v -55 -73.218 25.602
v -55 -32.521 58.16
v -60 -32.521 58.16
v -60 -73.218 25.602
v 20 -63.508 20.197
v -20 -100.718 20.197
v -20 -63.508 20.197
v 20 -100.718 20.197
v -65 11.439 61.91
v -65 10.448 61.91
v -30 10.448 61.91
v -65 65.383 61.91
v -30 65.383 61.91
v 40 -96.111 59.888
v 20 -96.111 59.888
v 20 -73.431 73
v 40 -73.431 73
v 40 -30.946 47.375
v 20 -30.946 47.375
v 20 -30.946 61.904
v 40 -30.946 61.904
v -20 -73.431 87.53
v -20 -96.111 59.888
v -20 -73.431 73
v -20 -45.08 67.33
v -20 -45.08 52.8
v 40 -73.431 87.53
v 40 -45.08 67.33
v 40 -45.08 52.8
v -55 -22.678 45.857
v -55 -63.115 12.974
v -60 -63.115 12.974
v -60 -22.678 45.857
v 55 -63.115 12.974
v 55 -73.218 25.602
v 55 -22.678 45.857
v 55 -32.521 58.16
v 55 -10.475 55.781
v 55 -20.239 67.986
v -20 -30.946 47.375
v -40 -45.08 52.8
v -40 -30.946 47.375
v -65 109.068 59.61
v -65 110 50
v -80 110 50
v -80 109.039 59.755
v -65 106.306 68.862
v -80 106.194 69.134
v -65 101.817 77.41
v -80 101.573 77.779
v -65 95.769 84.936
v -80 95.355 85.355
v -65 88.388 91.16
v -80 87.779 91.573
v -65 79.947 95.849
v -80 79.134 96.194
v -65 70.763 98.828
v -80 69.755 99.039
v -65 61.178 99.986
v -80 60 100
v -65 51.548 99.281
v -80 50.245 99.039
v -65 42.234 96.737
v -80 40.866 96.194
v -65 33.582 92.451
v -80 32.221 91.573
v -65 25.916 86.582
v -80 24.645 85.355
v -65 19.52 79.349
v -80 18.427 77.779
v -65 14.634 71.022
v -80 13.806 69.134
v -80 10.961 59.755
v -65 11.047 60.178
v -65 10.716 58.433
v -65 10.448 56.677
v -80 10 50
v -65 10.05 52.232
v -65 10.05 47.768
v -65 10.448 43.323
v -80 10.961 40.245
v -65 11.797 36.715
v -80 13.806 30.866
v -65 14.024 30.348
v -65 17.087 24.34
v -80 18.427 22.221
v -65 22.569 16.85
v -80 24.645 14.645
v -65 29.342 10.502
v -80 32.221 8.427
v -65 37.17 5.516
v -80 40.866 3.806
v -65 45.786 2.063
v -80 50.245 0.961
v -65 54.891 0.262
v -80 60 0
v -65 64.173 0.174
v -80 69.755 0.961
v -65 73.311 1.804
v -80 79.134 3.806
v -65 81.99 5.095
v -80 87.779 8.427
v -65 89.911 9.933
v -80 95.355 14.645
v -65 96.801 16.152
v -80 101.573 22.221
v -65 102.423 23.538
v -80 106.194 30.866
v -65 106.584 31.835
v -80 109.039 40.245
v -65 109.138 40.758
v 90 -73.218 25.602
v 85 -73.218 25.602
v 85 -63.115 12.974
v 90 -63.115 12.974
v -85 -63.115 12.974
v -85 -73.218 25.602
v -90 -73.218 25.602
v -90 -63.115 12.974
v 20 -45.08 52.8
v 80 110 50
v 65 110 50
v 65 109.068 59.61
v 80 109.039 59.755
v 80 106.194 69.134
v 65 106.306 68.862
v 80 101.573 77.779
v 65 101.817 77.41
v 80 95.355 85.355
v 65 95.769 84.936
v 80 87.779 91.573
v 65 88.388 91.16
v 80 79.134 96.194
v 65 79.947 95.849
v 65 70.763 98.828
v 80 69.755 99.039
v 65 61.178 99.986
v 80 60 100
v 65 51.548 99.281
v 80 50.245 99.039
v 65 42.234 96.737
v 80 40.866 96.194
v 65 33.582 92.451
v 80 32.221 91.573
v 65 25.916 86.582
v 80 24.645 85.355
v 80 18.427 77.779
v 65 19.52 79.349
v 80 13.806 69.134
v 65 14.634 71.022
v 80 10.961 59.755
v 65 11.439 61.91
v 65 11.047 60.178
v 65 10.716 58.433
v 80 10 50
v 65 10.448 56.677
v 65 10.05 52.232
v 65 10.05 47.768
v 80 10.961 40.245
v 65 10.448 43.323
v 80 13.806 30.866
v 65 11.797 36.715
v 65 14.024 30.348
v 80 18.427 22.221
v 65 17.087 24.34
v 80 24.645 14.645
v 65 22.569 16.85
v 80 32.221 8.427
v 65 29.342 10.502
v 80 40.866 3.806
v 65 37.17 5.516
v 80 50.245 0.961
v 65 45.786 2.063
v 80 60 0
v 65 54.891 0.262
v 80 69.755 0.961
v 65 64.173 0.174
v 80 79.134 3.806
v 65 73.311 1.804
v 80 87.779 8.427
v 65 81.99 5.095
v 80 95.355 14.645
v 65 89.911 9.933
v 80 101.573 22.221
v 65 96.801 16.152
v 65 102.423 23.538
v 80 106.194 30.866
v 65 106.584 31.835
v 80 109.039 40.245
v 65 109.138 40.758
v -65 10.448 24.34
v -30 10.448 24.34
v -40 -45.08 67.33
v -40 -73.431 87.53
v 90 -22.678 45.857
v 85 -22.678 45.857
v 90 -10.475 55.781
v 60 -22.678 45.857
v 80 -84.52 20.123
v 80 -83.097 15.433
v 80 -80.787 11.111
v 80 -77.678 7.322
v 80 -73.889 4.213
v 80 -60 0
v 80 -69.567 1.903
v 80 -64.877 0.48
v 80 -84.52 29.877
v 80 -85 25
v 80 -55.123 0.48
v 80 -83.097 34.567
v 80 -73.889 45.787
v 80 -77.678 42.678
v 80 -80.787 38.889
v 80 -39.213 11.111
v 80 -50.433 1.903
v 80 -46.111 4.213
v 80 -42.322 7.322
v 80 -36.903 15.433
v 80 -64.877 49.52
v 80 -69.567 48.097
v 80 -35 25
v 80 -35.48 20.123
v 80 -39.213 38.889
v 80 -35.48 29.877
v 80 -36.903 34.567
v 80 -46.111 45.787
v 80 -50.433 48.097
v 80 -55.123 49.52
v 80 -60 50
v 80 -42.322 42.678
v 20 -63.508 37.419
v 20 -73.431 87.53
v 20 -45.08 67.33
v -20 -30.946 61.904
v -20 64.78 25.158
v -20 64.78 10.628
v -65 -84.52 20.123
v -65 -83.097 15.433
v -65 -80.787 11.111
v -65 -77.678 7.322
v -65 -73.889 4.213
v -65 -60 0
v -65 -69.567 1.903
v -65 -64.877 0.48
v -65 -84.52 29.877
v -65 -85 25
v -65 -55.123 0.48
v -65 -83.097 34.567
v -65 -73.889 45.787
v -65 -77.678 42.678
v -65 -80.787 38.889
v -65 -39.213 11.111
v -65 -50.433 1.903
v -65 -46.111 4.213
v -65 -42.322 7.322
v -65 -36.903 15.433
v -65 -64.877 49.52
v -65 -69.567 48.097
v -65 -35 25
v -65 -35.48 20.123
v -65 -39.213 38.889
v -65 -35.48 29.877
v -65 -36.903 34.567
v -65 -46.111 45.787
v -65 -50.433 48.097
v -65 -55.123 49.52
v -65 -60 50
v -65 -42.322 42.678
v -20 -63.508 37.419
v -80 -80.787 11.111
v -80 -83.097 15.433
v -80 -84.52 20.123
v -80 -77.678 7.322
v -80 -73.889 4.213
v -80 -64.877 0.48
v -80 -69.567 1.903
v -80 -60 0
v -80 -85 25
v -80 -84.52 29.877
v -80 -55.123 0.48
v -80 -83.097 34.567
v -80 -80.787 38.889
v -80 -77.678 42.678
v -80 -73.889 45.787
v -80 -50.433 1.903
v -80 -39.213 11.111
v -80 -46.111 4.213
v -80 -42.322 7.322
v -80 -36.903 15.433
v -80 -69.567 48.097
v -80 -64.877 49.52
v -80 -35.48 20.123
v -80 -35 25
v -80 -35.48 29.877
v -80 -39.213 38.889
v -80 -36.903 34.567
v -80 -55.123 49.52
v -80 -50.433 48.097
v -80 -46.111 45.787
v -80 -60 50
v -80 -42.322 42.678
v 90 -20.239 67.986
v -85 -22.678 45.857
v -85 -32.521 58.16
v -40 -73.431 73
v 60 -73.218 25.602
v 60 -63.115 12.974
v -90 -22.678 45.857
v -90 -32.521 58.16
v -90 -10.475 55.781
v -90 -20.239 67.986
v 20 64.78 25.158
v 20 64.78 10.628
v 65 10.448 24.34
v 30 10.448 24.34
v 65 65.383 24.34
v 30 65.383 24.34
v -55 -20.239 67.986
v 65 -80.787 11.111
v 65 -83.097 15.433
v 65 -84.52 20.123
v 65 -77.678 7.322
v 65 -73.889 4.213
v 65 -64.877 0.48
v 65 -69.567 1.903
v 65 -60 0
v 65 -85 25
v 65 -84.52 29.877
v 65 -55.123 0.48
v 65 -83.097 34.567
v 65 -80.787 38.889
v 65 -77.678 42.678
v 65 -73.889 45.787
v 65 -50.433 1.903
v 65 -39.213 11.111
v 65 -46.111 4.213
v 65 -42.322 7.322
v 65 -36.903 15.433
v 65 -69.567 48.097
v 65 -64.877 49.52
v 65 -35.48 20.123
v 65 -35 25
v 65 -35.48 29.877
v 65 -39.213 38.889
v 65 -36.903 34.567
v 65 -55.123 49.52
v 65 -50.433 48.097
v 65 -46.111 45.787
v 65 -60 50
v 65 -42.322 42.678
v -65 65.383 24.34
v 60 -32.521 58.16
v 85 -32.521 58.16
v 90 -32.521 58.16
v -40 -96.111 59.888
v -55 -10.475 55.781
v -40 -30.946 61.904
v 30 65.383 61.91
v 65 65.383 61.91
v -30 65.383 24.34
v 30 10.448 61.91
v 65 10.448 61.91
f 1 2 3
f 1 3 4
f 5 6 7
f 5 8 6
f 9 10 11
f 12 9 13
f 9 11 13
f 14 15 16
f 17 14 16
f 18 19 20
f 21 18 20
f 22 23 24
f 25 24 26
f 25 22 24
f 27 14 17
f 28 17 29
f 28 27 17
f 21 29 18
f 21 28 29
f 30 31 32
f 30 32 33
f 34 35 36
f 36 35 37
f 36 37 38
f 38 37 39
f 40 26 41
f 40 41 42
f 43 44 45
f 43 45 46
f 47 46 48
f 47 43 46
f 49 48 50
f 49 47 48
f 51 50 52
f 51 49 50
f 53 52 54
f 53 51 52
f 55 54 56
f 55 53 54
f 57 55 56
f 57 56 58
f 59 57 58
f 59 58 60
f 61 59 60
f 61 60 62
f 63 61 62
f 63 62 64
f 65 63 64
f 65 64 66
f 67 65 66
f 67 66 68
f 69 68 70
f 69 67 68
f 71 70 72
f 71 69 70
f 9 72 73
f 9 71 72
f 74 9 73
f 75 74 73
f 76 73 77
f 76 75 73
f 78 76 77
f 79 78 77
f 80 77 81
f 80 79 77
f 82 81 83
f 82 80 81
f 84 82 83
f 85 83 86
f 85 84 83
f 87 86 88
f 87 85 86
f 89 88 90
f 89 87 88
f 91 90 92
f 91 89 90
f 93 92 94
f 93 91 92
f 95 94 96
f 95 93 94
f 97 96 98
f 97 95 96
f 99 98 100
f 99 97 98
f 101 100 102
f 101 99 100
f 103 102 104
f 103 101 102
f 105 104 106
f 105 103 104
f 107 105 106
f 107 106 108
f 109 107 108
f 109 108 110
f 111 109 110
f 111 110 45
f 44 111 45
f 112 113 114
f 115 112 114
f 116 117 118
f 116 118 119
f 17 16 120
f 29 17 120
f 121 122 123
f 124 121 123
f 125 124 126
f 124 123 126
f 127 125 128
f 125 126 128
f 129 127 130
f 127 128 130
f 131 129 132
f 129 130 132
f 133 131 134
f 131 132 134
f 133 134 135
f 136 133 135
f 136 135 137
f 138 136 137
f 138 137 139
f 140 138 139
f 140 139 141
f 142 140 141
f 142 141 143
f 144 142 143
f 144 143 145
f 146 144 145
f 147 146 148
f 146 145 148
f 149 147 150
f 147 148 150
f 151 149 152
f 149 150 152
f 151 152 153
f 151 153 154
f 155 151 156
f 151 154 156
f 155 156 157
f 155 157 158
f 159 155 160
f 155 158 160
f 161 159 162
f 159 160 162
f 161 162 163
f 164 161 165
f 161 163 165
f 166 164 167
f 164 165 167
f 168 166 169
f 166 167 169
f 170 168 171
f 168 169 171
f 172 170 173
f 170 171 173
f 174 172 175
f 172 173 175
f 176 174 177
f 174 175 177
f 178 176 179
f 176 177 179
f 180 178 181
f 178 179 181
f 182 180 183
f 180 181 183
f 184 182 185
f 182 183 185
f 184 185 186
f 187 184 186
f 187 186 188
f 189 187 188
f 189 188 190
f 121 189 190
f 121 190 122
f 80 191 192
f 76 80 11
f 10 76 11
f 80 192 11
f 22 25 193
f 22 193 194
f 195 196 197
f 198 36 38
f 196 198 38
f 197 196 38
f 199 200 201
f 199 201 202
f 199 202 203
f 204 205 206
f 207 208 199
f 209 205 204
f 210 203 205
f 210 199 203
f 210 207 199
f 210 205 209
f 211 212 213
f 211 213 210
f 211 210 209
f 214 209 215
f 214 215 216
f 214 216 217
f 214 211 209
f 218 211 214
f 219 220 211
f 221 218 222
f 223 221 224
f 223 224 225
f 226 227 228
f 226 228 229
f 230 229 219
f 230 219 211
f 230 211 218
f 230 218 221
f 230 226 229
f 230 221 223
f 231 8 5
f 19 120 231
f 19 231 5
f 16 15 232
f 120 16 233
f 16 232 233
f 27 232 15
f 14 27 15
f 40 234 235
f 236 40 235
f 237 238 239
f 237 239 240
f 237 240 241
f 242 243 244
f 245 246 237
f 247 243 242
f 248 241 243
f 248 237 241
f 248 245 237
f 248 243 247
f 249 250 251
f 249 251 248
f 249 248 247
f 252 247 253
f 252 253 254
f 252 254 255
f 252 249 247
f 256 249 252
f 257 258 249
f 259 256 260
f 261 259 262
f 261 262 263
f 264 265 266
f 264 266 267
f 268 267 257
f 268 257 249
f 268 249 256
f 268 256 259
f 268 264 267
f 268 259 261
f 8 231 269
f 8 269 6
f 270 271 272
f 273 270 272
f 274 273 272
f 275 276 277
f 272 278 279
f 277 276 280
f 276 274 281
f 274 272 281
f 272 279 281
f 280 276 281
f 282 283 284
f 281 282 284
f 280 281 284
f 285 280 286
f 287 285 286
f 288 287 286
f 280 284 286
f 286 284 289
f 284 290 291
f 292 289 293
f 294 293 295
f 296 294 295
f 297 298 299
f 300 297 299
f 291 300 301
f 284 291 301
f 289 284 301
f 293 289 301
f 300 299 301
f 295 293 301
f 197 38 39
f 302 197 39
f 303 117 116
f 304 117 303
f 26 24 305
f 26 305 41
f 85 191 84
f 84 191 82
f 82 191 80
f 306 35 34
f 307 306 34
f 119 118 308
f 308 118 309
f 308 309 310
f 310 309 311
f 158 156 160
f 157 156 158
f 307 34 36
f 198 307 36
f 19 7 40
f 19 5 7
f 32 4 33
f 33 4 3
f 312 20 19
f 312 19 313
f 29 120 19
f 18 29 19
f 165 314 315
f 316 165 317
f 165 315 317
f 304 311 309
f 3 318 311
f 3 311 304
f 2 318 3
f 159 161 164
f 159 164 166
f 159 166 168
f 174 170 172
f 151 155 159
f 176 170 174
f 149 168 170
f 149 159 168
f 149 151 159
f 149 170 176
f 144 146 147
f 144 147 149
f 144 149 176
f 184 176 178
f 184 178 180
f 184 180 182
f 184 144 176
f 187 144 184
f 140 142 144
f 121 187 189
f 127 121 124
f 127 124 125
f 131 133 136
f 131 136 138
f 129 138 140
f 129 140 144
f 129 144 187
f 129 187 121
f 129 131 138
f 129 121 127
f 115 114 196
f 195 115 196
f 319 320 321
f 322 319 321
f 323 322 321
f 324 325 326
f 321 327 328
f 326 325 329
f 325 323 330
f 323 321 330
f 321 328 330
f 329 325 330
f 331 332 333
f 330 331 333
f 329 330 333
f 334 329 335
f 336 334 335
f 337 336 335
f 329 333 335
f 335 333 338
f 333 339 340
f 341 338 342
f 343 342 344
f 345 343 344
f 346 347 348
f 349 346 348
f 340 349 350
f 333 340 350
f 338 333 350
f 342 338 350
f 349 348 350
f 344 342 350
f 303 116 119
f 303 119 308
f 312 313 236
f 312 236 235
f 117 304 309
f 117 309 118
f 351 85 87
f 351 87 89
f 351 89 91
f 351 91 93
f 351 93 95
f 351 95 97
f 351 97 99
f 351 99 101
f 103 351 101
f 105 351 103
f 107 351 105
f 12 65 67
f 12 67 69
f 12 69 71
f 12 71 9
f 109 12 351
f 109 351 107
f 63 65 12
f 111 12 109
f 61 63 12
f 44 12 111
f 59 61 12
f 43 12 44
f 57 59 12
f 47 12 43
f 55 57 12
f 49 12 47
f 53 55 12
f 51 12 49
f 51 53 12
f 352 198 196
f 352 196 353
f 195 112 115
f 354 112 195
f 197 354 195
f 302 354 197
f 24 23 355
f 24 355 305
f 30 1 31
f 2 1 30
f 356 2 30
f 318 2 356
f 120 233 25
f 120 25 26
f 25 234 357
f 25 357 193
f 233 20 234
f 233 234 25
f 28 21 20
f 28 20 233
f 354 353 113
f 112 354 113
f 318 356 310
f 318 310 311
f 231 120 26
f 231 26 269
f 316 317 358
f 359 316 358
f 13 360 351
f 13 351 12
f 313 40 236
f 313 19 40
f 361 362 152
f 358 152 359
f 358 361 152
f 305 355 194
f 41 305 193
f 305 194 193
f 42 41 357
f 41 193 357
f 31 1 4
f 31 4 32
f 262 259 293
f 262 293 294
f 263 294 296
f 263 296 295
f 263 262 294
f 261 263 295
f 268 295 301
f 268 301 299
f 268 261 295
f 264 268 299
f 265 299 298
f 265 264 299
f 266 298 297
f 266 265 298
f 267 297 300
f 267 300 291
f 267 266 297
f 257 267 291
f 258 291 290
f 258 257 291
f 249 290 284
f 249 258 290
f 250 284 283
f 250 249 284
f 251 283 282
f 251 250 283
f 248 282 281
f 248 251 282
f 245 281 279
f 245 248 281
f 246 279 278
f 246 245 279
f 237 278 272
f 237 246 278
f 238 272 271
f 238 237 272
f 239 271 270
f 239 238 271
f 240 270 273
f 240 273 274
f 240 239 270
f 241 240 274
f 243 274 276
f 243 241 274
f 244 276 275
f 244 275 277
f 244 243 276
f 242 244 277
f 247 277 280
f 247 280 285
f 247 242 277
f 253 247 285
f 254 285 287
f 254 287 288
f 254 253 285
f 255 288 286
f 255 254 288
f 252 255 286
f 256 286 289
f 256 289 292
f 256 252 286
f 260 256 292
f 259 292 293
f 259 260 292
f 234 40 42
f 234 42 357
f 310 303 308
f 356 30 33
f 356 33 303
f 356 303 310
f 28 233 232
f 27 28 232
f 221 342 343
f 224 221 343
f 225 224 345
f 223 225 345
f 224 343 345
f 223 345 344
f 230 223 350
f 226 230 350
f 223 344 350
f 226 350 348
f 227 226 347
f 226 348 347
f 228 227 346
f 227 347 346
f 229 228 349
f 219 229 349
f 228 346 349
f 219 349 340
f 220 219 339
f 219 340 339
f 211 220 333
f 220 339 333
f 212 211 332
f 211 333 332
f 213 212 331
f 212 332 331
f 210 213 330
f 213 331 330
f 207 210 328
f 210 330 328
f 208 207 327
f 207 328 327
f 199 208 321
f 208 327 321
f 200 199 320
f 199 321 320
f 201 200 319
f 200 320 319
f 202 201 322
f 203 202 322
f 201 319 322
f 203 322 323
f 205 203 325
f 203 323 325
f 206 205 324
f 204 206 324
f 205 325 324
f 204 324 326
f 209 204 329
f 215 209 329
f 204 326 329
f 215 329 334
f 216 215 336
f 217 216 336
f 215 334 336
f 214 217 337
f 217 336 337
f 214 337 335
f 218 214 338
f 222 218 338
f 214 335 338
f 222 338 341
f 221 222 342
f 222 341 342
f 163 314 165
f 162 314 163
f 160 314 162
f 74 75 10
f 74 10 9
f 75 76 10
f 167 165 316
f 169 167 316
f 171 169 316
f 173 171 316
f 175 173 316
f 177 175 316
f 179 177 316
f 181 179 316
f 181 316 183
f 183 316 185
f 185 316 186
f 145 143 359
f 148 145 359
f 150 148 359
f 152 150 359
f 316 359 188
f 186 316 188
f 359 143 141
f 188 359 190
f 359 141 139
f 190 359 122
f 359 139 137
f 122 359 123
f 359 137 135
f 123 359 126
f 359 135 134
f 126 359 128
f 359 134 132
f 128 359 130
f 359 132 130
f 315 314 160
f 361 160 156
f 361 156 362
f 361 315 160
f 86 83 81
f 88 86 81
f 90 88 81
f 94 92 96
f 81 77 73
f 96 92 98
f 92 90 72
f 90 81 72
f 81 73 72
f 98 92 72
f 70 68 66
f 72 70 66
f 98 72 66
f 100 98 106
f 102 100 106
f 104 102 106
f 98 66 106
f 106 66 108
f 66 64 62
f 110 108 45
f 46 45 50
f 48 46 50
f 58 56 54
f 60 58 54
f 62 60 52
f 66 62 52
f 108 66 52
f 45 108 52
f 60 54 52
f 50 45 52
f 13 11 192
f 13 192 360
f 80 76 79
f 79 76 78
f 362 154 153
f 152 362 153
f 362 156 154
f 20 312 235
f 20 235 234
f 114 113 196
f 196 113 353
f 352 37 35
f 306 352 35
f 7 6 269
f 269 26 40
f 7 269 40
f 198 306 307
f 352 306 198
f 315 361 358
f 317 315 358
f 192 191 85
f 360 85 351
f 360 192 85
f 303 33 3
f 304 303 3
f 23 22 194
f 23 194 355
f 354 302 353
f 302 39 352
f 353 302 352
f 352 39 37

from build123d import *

# Parameters (mm, degrees)
F1_START = 65
F0_R     = 50
F1_DEPTH = 15
F0_R_2   = 25
F3_START = 55
F3_DEPTH = 35
F4_START = 30
F2_W     = 54.935564287
F2_H     = 37.570875138
F4_DEPTH = 35
F5_START = 60
F5_DEPTH = 25
F7_DEPTH = 20
F8_START = 20
F8_DEPTH = 20


with BuildPart() as f1:
    # F0 (on Right) → F1 (new body)
    with BuildSketch(Plane.YZ.offset(F1_START)):
        with Locations((60, 50)):
            Circle(F0_R)
    extrude(amount=F1_DEPTH)

    # F2 (on Right) → F4 (join)
    with BuildSketch(Plane.YZ.offset(F4_START)):
        with Locations((37.9155925475, 43.1249979883)):
            Rectangle(F2_W, F2_H)
    extrude(amount=F4_DEPTH)


with BuildPart() as f1b:
    # F0 (on Right) → F1, piece 2 (new body)
    with BuildSketch(Plane.YZ.offset(F1_START)):
        with Locations((-60, 25)):
            Circle(F0_R_2)
    extrude(amount=F1_DEPTH)


with BuildPart() as f3:
    # F2 (on Right) → F3 (new body)
    with BuildSketch(Plane.YZ.offset(F3_START)):
        Polygon((-32.5211317695, 58.1602781919), (-22.6783181411, 45.8567584343), (-10.4745284982, 55.7808180227), (-20.2387908943, 67.9861487181), align=None)
        Polygon((-73.2184275985, 25.6024487317), (-63.1153360009, 12.9735814407), (-22.6783181411, 45.8567584343), (-32.5211317695, 58.1602781919), align=None)
    extrude(amount=F3_DEPTH)

    # F2 (on Right) → F5 (cut)
    with BuildSketch(Plane.YZ.offset(F5_START)):
        Polygon((-73.2184275985, 25.6024487317), (-63.1153360009, 12.9735814407), (-22.6783181411, 45.8567584343), (-32.5211317695, 58.1602781919), align=None)
    extrude(amount=F5_DEPTH, mode=Mode.SUBTRACT)


with BuildPart() as f7:
    # F6 (on Right) → F7 (new body, symmetric)
    with BuildSketch(Plane.YZ):
        Polygon((-30.946408709, 47.3746586235), (64.7797659039, 10.6281582266), (64.7797659039, 25.1579713076), (-30.946408709, 61.9044717045), align=None)
        Polygon((-45.0797565281, 52.8000406921), (-30.946408709, 47.3746586235), (-30.946408709, 61.9044717045), (-45.0797565281, 67.3298537731), align=None)
        Polygon((-63.507810235, 20.1965682209), (-30.946408709, 47.3746586235), (-45.0797565281, 52.8000406921), (-63.507810235, 37.4186600967), (-100.7182970643, 20.1965682209), align=None)
    extrude(amount=F7_DEPTH, both=True)



with BuildPart() as f8:
    # F6 (on Right) → F8 (new body)
    with BuildSketch(Plane.YZ.offset(F8_START)):
        Polygon((-45.0797565281, 52.8000406921), (-30.946408709, 47.3746586235), (-30.946408709, 61.9044717045), (-45.0797565281, 67.3298537731), align=None)
        Polygon((-73.4306126833, 73.0000212789), (-45.0797565281, 52.8000406921), (-45.0797565281, 67.3298537731), (-73.4306126833, 87.5298343599), (-96.1112827063, 59.8877519369), align=None)
    extrude(amount=F8_DEPTH)


with BuildPart() as f7_1:
    add(f7.part)

    add(f8.part)  # F9 merges F8
    # F9: F8, F1b, F3, F1 across plane
    add(f8.part.mirror(Plane.YZ))
    add(f1b.part.mirror(Plane.YZ))
    add(f3.part.mirror(Plane.YZ))
    add(f1.part.mirror(Plane.YZ))


solid = Compound([f1.part, f1b.part, f3.part, f7_1.part])
